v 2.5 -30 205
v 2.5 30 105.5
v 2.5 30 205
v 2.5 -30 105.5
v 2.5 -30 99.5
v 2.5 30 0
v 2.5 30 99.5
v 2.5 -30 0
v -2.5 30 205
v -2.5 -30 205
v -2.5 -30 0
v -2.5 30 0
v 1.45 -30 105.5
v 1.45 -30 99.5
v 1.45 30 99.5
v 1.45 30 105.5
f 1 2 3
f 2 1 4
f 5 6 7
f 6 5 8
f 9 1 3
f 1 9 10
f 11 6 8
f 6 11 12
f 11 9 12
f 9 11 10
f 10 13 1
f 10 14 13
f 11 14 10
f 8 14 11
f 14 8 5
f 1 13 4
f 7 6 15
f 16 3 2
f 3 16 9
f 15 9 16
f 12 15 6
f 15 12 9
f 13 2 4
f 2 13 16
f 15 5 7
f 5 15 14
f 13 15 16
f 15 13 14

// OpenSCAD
module selfleg(leg_length =205, self_n_woods=4, 
    wood_thickness=5, wood_width=15, 
    groove_depth=1, groove_height = 6, 
    first_leg=false, last_leg=false)
{
    self_depth = wood_width * self_n_woods;
    
    translate([0,0,leg_length/2])
    {
        difference()
        {
            for (y = [0:self_n_woods-1])
            {
                yy = y * wood_width - self_depth/2 + wood_width/2; 
                
                color([0.01 * rands(60,80,1)[0],
                    0.01 * rands(30,50,1)[0],
                    0.01 * rands(0,20,1)[0]])
                translate([0,yy,0])
                cube([wood_thickness, wood_width, leg_length],center=true);
            }
        
            if (!last_leg) {
                translate([wood_thickness/2-groove_depth/2,0,0])
                color([0.5,0.3,0.1])
                    cube([groove_depth+0.1, self_depth+0.1, 
                        groove_height],center=true);
            }
        }
    }
}

selfleg();
